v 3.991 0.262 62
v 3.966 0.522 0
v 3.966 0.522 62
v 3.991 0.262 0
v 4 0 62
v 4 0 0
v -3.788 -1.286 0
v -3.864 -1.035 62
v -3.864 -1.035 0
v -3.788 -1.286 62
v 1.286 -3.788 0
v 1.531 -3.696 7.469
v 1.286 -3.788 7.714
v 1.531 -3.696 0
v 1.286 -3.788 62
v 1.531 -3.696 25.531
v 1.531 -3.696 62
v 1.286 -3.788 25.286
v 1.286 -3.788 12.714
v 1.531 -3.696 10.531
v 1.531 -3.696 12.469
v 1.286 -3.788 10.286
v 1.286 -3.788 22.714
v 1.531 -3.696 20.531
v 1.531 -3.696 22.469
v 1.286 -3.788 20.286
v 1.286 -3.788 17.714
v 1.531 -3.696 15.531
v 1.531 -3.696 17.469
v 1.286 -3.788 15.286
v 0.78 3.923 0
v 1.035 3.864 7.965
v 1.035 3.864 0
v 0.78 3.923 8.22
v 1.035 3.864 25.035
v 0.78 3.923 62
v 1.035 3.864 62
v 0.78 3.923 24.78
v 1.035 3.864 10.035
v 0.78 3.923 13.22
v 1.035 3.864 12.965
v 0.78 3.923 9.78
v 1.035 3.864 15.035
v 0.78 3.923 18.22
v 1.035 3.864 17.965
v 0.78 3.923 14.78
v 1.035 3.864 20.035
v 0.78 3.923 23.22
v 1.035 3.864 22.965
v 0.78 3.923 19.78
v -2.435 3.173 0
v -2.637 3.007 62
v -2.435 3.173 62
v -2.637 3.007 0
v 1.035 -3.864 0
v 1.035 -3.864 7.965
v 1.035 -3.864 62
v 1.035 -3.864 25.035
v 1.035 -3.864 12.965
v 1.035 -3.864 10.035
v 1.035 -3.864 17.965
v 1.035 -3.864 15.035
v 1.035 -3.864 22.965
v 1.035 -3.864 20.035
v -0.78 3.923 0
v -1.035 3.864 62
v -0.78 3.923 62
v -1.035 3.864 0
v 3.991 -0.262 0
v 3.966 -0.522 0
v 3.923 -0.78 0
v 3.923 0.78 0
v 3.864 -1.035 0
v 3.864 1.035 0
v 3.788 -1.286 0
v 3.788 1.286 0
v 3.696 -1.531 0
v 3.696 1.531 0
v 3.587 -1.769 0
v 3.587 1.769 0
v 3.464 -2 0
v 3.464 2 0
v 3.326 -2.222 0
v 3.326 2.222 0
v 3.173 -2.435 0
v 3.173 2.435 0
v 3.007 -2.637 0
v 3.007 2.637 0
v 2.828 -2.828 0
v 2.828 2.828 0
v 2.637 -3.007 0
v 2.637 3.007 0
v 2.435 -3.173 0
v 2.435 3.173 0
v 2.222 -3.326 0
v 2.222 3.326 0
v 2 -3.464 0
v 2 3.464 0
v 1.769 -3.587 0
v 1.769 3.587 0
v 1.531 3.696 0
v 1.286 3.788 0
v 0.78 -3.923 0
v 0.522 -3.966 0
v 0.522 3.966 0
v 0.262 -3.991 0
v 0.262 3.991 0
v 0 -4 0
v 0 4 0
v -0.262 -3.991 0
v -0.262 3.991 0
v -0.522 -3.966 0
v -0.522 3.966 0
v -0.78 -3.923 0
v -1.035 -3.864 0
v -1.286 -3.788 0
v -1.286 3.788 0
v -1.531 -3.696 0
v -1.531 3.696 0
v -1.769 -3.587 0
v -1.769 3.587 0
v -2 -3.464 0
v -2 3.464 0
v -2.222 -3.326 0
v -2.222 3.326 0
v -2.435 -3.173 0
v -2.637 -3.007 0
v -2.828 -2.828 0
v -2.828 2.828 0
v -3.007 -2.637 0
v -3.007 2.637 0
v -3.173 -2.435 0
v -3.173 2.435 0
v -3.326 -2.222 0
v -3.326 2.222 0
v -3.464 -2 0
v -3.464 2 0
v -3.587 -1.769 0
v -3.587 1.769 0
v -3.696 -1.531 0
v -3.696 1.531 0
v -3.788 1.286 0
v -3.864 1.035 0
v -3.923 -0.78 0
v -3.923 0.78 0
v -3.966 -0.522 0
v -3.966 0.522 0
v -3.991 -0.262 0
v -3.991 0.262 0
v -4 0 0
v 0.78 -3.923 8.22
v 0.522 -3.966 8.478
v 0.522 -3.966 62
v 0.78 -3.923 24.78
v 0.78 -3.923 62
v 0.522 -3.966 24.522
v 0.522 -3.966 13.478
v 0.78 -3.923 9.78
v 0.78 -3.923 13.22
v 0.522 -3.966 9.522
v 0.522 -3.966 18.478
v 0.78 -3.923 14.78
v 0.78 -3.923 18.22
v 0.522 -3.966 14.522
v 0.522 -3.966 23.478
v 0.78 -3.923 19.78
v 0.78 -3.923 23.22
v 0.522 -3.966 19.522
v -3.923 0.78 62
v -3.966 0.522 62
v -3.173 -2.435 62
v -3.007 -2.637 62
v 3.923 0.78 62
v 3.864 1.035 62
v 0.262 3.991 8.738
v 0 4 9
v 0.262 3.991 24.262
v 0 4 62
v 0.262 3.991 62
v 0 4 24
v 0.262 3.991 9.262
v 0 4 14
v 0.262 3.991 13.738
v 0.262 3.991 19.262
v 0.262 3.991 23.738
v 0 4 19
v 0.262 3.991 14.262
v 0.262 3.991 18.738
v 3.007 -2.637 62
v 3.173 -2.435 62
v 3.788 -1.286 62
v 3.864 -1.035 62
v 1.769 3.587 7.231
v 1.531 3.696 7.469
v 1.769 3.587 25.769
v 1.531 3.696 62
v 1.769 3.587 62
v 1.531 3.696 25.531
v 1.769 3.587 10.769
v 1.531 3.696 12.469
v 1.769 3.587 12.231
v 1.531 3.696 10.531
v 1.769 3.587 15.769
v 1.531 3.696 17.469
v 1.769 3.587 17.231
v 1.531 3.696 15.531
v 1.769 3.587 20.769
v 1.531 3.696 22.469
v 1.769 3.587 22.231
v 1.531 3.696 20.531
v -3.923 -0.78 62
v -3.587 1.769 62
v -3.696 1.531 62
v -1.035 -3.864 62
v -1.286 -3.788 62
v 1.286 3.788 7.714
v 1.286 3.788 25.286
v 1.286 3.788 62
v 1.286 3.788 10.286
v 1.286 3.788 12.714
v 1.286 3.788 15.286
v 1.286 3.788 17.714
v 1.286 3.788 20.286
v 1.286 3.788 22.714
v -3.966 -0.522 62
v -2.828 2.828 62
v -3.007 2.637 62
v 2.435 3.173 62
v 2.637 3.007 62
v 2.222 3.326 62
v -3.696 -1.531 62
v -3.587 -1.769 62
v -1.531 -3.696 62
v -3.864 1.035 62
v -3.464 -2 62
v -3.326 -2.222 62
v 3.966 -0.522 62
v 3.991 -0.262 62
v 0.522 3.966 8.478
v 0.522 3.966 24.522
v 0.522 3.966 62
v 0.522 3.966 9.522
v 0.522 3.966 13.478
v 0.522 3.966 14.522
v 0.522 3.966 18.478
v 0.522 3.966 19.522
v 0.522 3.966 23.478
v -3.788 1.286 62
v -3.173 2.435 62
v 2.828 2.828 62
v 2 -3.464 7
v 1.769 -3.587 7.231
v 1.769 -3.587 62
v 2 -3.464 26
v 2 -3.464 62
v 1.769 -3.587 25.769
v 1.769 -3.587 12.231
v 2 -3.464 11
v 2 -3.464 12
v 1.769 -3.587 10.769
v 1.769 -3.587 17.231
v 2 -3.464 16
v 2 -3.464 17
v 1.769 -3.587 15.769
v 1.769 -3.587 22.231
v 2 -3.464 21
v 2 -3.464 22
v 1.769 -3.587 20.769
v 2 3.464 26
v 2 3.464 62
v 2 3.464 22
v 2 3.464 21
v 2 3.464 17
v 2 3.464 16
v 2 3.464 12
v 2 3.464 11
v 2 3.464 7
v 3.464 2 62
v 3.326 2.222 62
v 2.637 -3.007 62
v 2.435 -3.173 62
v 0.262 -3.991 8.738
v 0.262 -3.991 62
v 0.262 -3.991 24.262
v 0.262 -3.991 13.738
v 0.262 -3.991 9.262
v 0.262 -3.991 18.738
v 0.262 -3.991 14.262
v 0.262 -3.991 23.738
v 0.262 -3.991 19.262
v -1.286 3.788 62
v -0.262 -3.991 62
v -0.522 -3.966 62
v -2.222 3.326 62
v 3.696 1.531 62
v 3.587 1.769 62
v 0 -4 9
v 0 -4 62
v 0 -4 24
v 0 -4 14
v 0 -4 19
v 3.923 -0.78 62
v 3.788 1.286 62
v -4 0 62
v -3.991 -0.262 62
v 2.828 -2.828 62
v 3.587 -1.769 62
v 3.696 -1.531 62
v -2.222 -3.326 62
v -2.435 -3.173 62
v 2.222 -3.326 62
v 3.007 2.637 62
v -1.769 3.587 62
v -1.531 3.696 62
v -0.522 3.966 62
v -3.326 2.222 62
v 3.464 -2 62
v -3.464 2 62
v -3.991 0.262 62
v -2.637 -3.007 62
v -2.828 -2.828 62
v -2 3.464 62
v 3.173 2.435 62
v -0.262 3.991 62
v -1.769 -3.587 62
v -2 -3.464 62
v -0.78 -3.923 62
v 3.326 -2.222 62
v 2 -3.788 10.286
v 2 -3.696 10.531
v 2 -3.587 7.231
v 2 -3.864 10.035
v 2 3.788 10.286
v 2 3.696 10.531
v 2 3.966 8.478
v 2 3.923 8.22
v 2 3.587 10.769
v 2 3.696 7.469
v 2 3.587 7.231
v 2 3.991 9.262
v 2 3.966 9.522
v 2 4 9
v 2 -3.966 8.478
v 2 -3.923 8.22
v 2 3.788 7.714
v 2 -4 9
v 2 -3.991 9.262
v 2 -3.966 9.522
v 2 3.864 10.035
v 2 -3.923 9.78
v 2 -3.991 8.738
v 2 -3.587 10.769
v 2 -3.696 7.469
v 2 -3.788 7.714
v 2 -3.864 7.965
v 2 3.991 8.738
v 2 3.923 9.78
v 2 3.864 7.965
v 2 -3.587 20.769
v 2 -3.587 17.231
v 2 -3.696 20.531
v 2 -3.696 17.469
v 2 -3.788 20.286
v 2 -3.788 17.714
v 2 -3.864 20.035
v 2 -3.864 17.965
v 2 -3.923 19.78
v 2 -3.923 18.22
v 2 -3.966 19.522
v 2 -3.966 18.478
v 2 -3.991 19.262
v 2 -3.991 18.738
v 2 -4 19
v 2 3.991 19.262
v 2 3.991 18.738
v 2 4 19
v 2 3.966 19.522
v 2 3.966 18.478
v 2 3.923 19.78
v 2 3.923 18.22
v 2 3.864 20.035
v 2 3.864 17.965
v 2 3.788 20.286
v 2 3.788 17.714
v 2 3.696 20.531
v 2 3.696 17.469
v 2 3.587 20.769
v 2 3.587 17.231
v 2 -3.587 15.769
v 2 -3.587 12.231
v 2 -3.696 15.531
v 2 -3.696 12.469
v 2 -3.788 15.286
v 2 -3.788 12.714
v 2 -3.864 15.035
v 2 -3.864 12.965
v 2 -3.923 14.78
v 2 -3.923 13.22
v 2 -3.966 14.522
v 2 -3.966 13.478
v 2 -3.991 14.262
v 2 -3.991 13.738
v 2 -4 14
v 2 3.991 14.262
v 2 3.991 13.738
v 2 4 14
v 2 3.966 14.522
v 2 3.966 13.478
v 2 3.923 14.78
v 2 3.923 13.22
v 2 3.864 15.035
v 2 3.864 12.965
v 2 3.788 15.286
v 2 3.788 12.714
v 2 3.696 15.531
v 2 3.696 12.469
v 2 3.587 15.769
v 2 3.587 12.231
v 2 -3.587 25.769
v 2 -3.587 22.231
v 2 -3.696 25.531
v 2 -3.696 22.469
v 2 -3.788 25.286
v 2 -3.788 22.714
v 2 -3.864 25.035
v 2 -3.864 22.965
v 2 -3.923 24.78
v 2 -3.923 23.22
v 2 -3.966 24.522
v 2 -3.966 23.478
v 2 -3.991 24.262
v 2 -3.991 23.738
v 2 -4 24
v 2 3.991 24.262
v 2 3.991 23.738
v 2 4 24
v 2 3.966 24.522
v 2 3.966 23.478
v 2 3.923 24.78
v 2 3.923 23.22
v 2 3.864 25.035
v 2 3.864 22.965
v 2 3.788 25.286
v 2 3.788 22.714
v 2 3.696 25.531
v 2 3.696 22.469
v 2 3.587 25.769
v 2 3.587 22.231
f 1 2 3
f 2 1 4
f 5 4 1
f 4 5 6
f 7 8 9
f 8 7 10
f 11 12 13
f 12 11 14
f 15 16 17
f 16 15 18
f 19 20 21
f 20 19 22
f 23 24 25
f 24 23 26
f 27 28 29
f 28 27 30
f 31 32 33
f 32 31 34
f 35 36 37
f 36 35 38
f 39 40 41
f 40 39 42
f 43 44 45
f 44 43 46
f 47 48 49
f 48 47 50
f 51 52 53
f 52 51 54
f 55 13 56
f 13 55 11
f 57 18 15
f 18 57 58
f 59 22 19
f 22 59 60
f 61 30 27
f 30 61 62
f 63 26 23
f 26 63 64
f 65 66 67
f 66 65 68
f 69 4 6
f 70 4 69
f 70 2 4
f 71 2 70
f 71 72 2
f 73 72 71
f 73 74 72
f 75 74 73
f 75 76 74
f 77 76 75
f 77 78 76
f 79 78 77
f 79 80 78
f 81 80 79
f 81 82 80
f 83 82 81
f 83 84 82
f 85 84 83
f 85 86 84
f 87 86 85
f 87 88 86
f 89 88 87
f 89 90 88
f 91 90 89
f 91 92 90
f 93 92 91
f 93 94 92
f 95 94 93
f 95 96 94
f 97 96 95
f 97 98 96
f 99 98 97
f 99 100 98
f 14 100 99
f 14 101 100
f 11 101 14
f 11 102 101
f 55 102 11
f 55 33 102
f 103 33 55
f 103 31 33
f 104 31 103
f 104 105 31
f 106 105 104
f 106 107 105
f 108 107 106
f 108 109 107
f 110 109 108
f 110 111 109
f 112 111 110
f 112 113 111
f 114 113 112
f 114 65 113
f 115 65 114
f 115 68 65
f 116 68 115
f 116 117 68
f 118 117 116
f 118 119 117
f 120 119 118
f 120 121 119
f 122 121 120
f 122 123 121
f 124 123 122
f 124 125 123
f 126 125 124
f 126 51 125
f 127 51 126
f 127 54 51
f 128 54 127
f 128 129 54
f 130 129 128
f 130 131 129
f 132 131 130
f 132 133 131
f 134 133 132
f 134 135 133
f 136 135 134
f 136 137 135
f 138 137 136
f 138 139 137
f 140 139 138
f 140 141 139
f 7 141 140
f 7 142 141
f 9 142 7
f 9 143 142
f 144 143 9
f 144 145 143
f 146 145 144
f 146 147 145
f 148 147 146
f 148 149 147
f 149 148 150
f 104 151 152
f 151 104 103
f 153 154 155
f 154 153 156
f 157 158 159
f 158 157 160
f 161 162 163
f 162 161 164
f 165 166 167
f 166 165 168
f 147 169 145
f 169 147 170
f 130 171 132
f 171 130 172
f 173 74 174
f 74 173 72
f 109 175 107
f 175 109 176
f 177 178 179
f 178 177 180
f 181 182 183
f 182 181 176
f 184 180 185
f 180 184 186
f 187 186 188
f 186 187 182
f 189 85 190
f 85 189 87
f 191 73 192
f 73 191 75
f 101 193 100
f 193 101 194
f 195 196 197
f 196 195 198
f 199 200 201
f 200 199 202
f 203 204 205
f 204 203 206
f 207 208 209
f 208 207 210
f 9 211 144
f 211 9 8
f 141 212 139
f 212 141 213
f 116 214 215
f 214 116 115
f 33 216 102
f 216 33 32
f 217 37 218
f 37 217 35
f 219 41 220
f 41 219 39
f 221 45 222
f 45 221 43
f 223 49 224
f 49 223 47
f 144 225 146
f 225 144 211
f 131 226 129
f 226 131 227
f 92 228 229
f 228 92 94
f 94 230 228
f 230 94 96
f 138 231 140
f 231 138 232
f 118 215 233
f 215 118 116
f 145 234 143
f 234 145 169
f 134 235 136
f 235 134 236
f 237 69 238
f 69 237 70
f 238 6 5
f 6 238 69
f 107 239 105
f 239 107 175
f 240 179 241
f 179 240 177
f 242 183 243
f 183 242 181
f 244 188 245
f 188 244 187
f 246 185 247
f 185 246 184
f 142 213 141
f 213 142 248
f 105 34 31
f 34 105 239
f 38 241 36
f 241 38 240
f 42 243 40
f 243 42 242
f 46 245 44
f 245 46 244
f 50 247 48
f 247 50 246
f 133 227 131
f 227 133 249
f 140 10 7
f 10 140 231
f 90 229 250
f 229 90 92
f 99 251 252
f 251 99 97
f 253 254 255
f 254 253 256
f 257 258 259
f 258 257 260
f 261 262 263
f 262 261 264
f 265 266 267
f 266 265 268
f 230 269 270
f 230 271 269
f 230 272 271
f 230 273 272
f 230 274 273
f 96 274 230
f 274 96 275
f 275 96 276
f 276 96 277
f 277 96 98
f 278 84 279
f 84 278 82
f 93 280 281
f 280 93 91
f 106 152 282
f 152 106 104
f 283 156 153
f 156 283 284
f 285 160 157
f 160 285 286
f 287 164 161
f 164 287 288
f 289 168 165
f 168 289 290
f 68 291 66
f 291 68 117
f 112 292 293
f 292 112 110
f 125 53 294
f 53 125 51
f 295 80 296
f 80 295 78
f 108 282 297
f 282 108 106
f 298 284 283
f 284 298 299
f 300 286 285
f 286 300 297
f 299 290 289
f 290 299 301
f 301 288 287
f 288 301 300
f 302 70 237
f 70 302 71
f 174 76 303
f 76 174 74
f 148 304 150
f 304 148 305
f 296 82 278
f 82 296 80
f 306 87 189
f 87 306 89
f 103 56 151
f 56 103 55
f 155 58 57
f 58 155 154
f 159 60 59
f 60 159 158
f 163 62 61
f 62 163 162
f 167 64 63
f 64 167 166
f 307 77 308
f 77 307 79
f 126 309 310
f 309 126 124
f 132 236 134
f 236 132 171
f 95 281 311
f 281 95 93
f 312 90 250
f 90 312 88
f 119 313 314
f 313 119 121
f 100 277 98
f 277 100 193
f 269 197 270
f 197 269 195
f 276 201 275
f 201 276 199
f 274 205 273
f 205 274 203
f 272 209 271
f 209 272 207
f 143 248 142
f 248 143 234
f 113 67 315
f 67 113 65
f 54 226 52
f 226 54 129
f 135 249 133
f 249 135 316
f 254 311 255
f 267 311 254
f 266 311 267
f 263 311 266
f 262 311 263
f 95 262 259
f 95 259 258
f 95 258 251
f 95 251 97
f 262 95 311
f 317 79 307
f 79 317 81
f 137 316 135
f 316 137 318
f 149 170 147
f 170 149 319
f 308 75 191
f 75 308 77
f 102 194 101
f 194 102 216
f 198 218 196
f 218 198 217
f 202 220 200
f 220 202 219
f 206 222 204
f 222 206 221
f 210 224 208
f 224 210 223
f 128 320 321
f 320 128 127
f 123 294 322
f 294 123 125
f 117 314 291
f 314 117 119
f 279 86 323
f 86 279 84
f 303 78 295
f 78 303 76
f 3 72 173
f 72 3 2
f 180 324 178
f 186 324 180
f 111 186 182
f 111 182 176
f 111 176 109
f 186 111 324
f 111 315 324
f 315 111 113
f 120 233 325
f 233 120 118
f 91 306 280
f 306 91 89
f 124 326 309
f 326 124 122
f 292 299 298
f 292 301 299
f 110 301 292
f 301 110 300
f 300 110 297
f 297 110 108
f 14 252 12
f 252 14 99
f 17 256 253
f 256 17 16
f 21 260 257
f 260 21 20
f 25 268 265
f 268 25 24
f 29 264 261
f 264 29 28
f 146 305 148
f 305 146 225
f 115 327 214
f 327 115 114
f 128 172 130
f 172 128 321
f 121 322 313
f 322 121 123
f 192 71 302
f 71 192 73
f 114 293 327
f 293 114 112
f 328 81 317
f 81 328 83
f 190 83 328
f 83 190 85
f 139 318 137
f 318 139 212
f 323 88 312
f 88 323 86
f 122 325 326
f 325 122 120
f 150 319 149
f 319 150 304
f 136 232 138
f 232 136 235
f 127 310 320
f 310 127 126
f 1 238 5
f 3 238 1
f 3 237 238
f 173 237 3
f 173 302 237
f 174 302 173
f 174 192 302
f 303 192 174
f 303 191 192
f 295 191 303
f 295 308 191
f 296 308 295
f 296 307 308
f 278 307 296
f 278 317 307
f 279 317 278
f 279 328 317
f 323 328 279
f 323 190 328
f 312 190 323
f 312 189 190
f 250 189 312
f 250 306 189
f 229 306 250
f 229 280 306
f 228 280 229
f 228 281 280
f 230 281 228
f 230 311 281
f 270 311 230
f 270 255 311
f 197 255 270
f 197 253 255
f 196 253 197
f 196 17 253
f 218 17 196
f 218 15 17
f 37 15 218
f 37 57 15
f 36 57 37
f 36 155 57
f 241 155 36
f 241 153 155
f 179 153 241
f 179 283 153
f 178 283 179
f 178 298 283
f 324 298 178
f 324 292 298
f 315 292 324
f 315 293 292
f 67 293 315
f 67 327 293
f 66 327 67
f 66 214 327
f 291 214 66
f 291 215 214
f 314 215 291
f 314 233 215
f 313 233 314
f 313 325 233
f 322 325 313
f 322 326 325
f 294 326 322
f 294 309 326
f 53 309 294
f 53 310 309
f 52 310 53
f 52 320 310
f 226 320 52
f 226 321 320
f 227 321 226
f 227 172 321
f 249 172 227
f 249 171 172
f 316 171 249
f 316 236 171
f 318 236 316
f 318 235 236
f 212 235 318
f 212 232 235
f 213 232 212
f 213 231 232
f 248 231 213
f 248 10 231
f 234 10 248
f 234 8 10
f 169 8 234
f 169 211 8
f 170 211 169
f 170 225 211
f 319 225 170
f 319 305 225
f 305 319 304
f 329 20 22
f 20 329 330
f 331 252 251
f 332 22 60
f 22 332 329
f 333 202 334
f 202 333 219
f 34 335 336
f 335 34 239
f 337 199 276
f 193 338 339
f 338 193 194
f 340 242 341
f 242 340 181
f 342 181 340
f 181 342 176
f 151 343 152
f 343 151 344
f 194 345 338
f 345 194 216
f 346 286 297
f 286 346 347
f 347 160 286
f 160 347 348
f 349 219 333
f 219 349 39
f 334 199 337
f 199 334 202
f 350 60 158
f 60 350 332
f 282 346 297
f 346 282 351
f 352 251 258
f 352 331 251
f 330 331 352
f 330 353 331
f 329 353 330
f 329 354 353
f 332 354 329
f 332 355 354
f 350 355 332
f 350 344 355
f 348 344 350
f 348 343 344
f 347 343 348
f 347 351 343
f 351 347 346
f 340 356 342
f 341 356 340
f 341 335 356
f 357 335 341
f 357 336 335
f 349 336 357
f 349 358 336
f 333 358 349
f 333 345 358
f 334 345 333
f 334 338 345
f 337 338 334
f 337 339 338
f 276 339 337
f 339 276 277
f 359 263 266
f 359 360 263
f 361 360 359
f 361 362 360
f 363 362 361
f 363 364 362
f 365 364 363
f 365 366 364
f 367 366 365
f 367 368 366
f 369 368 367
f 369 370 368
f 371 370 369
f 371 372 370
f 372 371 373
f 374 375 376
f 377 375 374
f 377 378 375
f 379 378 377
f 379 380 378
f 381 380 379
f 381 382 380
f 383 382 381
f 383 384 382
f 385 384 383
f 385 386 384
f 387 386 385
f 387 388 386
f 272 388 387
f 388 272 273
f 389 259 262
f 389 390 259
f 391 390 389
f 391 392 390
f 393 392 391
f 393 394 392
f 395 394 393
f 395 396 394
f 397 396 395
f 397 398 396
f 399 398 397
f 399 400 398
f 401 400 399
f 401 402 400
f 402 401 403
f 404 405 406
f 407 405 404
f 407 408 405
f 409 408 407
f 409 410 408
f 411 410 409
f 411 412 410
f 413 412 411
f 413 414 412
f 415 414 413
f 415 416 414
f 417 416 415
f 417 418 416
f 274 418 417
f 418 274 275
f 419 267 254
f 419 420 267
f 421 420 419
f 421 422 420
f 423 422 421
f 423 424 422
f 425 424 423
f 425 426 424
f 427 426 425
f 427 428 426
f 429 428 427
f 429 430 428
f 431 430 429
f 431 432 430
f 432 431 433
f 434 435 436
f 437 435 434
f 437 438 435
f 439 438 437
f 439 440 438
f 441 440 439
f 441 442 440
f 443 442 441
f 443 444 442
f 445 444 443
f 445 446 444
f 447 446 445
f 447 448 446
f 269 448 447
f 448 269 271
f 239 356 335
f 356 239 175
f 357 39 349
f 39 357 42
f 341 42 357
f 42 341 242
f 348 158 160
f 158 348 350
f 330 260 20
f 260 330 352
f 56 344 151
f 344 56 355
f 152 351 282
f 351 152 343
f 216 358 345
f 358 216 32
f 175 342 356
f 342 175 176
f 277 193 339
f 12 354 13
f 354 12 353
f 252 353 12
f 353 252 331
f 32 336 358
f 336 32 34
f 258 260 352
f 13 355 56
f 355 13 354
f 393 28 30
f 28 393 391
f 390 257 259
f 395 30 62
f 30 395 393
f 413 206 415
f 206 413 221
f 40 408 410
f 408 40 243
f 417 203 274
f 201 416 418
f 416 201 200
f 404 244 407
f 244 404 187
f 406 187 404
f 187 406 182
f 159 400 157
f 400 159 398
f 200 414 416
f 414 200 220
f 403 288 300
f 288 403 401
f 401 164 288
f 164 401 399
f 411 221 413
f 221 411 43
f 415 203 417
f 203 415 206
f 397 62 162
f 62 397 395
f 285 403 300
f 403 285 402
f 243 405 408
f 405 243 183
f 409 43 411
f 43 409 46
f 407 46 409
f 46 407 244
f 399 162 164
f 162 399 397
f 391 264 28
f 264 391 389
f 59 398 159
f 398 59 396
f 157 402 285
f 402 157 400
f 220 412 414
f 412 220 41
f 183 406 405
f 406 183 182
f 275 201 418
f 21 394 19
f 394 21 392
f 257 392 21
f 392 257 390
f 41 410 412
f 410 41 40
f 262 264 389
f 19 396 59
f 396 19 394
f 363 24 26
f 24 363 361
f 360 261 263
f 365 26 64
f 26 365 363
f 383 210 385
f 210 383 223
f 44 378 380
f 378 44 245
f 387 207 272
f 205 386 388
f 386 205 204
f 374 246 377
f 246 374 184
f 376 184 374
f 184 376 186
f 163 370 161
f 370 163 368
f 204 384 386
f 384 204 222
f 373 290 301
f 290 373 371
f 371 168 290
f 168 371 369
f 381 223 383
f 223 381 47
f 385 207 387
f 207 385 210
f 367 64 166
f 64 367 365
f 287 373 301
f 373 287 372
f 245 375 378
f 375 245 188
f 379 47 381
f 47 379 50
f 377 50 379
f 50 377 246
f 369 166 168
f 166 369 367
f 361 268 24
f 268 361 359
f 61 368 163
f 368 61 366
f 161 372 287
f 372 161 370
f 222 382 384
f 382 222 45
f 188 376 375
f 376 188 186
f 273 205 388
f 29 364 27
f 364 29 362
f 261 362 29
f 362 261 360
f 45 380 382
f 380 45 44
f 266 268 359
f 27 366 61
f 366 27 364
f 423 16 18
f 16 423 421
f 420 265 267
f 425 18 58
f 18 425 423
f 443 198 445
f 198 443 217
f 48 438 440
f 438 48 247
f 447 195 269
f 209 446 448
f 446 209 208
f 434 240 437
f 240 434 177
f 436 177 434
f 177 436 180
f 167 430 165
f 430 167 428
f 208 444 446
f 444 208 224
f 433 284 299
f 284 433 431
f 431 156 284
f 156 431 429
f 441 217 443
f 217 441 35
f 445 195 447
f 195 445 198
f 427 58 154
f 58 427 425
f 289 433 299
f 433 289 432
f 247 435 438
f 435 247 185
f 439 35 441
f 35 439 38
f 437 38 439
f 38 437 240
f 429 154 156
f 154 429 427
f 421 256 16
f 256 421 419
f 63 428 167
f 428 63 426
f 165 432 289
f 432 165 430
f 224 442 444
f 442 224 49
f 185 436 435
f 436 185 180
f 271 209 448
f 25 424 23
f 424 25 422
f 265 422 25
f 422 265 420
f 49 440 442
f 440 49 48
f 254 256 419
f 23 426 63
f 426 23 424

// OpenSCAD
// Pestle for grinding tissue in a 1.5 mL microcentrifuge tube
// Print orientation: standing upright, handle on the bed (z = 0)

// ---------------- Parameters ----------------
handle_d      = 8;     // handle diameter (mm)
handle_h      = 45;    // handle height (mm)

cone_top_d    = 8;     // cone diameter at top of handle (mm)
cone_bottom_d = 3;     // cone diameter at tip start (mm)
cone_h        = 17;    // cone height (mm) (z = 45 to z = 62)

tip_d         = 3;     // sphere tip diameter (mm)
tip_z         = 62;    // sphere centre height (mm)

groove_w      = 2;     // groove width in Z (mm)
groove_depth  = 1;     // groove depth from surface (mm)
groove_zs     = [10, 15, 20, 25]; // groove centre heights (mm)

eps           = 0.5;   // cutter overshoot past faces (mm)
$fn           = 96;    // curve resolution

// ---------------- Model ----------------
union() {
    // Handle
    cylinder(d = handle_d, h = handle_h);

    // Tapered cone
    translate([0, 0, handle_h])
        linear_extrude(cone_h)
            circle(d = cone_top_d);
    translate([0, 0, handle_h + cone_h])
        linear_extrude(-eps)
            circle(d = cone_bottom_d);

    // Rounded tip (sphere centred at z = tip_z)
    translate([0, 0, tip_z - tip_d / 2])
        sphere(d = tip_d);
}

// Grip grooves
for (z = groove_zs)
    translate([0, 0, z - groove_w / 2])
        rotate([0, 90, 0])
            difference() {
                cylinder(d = handle_d, h = groove_w);
                translate([-(handle_d / 2 - groove_depth), 0, 0])
                    rotate([0, 0, 90])
                        cylinder(d = handle_d - 2 * groove_depth, h = groove_w + 2 * eps);
            }
